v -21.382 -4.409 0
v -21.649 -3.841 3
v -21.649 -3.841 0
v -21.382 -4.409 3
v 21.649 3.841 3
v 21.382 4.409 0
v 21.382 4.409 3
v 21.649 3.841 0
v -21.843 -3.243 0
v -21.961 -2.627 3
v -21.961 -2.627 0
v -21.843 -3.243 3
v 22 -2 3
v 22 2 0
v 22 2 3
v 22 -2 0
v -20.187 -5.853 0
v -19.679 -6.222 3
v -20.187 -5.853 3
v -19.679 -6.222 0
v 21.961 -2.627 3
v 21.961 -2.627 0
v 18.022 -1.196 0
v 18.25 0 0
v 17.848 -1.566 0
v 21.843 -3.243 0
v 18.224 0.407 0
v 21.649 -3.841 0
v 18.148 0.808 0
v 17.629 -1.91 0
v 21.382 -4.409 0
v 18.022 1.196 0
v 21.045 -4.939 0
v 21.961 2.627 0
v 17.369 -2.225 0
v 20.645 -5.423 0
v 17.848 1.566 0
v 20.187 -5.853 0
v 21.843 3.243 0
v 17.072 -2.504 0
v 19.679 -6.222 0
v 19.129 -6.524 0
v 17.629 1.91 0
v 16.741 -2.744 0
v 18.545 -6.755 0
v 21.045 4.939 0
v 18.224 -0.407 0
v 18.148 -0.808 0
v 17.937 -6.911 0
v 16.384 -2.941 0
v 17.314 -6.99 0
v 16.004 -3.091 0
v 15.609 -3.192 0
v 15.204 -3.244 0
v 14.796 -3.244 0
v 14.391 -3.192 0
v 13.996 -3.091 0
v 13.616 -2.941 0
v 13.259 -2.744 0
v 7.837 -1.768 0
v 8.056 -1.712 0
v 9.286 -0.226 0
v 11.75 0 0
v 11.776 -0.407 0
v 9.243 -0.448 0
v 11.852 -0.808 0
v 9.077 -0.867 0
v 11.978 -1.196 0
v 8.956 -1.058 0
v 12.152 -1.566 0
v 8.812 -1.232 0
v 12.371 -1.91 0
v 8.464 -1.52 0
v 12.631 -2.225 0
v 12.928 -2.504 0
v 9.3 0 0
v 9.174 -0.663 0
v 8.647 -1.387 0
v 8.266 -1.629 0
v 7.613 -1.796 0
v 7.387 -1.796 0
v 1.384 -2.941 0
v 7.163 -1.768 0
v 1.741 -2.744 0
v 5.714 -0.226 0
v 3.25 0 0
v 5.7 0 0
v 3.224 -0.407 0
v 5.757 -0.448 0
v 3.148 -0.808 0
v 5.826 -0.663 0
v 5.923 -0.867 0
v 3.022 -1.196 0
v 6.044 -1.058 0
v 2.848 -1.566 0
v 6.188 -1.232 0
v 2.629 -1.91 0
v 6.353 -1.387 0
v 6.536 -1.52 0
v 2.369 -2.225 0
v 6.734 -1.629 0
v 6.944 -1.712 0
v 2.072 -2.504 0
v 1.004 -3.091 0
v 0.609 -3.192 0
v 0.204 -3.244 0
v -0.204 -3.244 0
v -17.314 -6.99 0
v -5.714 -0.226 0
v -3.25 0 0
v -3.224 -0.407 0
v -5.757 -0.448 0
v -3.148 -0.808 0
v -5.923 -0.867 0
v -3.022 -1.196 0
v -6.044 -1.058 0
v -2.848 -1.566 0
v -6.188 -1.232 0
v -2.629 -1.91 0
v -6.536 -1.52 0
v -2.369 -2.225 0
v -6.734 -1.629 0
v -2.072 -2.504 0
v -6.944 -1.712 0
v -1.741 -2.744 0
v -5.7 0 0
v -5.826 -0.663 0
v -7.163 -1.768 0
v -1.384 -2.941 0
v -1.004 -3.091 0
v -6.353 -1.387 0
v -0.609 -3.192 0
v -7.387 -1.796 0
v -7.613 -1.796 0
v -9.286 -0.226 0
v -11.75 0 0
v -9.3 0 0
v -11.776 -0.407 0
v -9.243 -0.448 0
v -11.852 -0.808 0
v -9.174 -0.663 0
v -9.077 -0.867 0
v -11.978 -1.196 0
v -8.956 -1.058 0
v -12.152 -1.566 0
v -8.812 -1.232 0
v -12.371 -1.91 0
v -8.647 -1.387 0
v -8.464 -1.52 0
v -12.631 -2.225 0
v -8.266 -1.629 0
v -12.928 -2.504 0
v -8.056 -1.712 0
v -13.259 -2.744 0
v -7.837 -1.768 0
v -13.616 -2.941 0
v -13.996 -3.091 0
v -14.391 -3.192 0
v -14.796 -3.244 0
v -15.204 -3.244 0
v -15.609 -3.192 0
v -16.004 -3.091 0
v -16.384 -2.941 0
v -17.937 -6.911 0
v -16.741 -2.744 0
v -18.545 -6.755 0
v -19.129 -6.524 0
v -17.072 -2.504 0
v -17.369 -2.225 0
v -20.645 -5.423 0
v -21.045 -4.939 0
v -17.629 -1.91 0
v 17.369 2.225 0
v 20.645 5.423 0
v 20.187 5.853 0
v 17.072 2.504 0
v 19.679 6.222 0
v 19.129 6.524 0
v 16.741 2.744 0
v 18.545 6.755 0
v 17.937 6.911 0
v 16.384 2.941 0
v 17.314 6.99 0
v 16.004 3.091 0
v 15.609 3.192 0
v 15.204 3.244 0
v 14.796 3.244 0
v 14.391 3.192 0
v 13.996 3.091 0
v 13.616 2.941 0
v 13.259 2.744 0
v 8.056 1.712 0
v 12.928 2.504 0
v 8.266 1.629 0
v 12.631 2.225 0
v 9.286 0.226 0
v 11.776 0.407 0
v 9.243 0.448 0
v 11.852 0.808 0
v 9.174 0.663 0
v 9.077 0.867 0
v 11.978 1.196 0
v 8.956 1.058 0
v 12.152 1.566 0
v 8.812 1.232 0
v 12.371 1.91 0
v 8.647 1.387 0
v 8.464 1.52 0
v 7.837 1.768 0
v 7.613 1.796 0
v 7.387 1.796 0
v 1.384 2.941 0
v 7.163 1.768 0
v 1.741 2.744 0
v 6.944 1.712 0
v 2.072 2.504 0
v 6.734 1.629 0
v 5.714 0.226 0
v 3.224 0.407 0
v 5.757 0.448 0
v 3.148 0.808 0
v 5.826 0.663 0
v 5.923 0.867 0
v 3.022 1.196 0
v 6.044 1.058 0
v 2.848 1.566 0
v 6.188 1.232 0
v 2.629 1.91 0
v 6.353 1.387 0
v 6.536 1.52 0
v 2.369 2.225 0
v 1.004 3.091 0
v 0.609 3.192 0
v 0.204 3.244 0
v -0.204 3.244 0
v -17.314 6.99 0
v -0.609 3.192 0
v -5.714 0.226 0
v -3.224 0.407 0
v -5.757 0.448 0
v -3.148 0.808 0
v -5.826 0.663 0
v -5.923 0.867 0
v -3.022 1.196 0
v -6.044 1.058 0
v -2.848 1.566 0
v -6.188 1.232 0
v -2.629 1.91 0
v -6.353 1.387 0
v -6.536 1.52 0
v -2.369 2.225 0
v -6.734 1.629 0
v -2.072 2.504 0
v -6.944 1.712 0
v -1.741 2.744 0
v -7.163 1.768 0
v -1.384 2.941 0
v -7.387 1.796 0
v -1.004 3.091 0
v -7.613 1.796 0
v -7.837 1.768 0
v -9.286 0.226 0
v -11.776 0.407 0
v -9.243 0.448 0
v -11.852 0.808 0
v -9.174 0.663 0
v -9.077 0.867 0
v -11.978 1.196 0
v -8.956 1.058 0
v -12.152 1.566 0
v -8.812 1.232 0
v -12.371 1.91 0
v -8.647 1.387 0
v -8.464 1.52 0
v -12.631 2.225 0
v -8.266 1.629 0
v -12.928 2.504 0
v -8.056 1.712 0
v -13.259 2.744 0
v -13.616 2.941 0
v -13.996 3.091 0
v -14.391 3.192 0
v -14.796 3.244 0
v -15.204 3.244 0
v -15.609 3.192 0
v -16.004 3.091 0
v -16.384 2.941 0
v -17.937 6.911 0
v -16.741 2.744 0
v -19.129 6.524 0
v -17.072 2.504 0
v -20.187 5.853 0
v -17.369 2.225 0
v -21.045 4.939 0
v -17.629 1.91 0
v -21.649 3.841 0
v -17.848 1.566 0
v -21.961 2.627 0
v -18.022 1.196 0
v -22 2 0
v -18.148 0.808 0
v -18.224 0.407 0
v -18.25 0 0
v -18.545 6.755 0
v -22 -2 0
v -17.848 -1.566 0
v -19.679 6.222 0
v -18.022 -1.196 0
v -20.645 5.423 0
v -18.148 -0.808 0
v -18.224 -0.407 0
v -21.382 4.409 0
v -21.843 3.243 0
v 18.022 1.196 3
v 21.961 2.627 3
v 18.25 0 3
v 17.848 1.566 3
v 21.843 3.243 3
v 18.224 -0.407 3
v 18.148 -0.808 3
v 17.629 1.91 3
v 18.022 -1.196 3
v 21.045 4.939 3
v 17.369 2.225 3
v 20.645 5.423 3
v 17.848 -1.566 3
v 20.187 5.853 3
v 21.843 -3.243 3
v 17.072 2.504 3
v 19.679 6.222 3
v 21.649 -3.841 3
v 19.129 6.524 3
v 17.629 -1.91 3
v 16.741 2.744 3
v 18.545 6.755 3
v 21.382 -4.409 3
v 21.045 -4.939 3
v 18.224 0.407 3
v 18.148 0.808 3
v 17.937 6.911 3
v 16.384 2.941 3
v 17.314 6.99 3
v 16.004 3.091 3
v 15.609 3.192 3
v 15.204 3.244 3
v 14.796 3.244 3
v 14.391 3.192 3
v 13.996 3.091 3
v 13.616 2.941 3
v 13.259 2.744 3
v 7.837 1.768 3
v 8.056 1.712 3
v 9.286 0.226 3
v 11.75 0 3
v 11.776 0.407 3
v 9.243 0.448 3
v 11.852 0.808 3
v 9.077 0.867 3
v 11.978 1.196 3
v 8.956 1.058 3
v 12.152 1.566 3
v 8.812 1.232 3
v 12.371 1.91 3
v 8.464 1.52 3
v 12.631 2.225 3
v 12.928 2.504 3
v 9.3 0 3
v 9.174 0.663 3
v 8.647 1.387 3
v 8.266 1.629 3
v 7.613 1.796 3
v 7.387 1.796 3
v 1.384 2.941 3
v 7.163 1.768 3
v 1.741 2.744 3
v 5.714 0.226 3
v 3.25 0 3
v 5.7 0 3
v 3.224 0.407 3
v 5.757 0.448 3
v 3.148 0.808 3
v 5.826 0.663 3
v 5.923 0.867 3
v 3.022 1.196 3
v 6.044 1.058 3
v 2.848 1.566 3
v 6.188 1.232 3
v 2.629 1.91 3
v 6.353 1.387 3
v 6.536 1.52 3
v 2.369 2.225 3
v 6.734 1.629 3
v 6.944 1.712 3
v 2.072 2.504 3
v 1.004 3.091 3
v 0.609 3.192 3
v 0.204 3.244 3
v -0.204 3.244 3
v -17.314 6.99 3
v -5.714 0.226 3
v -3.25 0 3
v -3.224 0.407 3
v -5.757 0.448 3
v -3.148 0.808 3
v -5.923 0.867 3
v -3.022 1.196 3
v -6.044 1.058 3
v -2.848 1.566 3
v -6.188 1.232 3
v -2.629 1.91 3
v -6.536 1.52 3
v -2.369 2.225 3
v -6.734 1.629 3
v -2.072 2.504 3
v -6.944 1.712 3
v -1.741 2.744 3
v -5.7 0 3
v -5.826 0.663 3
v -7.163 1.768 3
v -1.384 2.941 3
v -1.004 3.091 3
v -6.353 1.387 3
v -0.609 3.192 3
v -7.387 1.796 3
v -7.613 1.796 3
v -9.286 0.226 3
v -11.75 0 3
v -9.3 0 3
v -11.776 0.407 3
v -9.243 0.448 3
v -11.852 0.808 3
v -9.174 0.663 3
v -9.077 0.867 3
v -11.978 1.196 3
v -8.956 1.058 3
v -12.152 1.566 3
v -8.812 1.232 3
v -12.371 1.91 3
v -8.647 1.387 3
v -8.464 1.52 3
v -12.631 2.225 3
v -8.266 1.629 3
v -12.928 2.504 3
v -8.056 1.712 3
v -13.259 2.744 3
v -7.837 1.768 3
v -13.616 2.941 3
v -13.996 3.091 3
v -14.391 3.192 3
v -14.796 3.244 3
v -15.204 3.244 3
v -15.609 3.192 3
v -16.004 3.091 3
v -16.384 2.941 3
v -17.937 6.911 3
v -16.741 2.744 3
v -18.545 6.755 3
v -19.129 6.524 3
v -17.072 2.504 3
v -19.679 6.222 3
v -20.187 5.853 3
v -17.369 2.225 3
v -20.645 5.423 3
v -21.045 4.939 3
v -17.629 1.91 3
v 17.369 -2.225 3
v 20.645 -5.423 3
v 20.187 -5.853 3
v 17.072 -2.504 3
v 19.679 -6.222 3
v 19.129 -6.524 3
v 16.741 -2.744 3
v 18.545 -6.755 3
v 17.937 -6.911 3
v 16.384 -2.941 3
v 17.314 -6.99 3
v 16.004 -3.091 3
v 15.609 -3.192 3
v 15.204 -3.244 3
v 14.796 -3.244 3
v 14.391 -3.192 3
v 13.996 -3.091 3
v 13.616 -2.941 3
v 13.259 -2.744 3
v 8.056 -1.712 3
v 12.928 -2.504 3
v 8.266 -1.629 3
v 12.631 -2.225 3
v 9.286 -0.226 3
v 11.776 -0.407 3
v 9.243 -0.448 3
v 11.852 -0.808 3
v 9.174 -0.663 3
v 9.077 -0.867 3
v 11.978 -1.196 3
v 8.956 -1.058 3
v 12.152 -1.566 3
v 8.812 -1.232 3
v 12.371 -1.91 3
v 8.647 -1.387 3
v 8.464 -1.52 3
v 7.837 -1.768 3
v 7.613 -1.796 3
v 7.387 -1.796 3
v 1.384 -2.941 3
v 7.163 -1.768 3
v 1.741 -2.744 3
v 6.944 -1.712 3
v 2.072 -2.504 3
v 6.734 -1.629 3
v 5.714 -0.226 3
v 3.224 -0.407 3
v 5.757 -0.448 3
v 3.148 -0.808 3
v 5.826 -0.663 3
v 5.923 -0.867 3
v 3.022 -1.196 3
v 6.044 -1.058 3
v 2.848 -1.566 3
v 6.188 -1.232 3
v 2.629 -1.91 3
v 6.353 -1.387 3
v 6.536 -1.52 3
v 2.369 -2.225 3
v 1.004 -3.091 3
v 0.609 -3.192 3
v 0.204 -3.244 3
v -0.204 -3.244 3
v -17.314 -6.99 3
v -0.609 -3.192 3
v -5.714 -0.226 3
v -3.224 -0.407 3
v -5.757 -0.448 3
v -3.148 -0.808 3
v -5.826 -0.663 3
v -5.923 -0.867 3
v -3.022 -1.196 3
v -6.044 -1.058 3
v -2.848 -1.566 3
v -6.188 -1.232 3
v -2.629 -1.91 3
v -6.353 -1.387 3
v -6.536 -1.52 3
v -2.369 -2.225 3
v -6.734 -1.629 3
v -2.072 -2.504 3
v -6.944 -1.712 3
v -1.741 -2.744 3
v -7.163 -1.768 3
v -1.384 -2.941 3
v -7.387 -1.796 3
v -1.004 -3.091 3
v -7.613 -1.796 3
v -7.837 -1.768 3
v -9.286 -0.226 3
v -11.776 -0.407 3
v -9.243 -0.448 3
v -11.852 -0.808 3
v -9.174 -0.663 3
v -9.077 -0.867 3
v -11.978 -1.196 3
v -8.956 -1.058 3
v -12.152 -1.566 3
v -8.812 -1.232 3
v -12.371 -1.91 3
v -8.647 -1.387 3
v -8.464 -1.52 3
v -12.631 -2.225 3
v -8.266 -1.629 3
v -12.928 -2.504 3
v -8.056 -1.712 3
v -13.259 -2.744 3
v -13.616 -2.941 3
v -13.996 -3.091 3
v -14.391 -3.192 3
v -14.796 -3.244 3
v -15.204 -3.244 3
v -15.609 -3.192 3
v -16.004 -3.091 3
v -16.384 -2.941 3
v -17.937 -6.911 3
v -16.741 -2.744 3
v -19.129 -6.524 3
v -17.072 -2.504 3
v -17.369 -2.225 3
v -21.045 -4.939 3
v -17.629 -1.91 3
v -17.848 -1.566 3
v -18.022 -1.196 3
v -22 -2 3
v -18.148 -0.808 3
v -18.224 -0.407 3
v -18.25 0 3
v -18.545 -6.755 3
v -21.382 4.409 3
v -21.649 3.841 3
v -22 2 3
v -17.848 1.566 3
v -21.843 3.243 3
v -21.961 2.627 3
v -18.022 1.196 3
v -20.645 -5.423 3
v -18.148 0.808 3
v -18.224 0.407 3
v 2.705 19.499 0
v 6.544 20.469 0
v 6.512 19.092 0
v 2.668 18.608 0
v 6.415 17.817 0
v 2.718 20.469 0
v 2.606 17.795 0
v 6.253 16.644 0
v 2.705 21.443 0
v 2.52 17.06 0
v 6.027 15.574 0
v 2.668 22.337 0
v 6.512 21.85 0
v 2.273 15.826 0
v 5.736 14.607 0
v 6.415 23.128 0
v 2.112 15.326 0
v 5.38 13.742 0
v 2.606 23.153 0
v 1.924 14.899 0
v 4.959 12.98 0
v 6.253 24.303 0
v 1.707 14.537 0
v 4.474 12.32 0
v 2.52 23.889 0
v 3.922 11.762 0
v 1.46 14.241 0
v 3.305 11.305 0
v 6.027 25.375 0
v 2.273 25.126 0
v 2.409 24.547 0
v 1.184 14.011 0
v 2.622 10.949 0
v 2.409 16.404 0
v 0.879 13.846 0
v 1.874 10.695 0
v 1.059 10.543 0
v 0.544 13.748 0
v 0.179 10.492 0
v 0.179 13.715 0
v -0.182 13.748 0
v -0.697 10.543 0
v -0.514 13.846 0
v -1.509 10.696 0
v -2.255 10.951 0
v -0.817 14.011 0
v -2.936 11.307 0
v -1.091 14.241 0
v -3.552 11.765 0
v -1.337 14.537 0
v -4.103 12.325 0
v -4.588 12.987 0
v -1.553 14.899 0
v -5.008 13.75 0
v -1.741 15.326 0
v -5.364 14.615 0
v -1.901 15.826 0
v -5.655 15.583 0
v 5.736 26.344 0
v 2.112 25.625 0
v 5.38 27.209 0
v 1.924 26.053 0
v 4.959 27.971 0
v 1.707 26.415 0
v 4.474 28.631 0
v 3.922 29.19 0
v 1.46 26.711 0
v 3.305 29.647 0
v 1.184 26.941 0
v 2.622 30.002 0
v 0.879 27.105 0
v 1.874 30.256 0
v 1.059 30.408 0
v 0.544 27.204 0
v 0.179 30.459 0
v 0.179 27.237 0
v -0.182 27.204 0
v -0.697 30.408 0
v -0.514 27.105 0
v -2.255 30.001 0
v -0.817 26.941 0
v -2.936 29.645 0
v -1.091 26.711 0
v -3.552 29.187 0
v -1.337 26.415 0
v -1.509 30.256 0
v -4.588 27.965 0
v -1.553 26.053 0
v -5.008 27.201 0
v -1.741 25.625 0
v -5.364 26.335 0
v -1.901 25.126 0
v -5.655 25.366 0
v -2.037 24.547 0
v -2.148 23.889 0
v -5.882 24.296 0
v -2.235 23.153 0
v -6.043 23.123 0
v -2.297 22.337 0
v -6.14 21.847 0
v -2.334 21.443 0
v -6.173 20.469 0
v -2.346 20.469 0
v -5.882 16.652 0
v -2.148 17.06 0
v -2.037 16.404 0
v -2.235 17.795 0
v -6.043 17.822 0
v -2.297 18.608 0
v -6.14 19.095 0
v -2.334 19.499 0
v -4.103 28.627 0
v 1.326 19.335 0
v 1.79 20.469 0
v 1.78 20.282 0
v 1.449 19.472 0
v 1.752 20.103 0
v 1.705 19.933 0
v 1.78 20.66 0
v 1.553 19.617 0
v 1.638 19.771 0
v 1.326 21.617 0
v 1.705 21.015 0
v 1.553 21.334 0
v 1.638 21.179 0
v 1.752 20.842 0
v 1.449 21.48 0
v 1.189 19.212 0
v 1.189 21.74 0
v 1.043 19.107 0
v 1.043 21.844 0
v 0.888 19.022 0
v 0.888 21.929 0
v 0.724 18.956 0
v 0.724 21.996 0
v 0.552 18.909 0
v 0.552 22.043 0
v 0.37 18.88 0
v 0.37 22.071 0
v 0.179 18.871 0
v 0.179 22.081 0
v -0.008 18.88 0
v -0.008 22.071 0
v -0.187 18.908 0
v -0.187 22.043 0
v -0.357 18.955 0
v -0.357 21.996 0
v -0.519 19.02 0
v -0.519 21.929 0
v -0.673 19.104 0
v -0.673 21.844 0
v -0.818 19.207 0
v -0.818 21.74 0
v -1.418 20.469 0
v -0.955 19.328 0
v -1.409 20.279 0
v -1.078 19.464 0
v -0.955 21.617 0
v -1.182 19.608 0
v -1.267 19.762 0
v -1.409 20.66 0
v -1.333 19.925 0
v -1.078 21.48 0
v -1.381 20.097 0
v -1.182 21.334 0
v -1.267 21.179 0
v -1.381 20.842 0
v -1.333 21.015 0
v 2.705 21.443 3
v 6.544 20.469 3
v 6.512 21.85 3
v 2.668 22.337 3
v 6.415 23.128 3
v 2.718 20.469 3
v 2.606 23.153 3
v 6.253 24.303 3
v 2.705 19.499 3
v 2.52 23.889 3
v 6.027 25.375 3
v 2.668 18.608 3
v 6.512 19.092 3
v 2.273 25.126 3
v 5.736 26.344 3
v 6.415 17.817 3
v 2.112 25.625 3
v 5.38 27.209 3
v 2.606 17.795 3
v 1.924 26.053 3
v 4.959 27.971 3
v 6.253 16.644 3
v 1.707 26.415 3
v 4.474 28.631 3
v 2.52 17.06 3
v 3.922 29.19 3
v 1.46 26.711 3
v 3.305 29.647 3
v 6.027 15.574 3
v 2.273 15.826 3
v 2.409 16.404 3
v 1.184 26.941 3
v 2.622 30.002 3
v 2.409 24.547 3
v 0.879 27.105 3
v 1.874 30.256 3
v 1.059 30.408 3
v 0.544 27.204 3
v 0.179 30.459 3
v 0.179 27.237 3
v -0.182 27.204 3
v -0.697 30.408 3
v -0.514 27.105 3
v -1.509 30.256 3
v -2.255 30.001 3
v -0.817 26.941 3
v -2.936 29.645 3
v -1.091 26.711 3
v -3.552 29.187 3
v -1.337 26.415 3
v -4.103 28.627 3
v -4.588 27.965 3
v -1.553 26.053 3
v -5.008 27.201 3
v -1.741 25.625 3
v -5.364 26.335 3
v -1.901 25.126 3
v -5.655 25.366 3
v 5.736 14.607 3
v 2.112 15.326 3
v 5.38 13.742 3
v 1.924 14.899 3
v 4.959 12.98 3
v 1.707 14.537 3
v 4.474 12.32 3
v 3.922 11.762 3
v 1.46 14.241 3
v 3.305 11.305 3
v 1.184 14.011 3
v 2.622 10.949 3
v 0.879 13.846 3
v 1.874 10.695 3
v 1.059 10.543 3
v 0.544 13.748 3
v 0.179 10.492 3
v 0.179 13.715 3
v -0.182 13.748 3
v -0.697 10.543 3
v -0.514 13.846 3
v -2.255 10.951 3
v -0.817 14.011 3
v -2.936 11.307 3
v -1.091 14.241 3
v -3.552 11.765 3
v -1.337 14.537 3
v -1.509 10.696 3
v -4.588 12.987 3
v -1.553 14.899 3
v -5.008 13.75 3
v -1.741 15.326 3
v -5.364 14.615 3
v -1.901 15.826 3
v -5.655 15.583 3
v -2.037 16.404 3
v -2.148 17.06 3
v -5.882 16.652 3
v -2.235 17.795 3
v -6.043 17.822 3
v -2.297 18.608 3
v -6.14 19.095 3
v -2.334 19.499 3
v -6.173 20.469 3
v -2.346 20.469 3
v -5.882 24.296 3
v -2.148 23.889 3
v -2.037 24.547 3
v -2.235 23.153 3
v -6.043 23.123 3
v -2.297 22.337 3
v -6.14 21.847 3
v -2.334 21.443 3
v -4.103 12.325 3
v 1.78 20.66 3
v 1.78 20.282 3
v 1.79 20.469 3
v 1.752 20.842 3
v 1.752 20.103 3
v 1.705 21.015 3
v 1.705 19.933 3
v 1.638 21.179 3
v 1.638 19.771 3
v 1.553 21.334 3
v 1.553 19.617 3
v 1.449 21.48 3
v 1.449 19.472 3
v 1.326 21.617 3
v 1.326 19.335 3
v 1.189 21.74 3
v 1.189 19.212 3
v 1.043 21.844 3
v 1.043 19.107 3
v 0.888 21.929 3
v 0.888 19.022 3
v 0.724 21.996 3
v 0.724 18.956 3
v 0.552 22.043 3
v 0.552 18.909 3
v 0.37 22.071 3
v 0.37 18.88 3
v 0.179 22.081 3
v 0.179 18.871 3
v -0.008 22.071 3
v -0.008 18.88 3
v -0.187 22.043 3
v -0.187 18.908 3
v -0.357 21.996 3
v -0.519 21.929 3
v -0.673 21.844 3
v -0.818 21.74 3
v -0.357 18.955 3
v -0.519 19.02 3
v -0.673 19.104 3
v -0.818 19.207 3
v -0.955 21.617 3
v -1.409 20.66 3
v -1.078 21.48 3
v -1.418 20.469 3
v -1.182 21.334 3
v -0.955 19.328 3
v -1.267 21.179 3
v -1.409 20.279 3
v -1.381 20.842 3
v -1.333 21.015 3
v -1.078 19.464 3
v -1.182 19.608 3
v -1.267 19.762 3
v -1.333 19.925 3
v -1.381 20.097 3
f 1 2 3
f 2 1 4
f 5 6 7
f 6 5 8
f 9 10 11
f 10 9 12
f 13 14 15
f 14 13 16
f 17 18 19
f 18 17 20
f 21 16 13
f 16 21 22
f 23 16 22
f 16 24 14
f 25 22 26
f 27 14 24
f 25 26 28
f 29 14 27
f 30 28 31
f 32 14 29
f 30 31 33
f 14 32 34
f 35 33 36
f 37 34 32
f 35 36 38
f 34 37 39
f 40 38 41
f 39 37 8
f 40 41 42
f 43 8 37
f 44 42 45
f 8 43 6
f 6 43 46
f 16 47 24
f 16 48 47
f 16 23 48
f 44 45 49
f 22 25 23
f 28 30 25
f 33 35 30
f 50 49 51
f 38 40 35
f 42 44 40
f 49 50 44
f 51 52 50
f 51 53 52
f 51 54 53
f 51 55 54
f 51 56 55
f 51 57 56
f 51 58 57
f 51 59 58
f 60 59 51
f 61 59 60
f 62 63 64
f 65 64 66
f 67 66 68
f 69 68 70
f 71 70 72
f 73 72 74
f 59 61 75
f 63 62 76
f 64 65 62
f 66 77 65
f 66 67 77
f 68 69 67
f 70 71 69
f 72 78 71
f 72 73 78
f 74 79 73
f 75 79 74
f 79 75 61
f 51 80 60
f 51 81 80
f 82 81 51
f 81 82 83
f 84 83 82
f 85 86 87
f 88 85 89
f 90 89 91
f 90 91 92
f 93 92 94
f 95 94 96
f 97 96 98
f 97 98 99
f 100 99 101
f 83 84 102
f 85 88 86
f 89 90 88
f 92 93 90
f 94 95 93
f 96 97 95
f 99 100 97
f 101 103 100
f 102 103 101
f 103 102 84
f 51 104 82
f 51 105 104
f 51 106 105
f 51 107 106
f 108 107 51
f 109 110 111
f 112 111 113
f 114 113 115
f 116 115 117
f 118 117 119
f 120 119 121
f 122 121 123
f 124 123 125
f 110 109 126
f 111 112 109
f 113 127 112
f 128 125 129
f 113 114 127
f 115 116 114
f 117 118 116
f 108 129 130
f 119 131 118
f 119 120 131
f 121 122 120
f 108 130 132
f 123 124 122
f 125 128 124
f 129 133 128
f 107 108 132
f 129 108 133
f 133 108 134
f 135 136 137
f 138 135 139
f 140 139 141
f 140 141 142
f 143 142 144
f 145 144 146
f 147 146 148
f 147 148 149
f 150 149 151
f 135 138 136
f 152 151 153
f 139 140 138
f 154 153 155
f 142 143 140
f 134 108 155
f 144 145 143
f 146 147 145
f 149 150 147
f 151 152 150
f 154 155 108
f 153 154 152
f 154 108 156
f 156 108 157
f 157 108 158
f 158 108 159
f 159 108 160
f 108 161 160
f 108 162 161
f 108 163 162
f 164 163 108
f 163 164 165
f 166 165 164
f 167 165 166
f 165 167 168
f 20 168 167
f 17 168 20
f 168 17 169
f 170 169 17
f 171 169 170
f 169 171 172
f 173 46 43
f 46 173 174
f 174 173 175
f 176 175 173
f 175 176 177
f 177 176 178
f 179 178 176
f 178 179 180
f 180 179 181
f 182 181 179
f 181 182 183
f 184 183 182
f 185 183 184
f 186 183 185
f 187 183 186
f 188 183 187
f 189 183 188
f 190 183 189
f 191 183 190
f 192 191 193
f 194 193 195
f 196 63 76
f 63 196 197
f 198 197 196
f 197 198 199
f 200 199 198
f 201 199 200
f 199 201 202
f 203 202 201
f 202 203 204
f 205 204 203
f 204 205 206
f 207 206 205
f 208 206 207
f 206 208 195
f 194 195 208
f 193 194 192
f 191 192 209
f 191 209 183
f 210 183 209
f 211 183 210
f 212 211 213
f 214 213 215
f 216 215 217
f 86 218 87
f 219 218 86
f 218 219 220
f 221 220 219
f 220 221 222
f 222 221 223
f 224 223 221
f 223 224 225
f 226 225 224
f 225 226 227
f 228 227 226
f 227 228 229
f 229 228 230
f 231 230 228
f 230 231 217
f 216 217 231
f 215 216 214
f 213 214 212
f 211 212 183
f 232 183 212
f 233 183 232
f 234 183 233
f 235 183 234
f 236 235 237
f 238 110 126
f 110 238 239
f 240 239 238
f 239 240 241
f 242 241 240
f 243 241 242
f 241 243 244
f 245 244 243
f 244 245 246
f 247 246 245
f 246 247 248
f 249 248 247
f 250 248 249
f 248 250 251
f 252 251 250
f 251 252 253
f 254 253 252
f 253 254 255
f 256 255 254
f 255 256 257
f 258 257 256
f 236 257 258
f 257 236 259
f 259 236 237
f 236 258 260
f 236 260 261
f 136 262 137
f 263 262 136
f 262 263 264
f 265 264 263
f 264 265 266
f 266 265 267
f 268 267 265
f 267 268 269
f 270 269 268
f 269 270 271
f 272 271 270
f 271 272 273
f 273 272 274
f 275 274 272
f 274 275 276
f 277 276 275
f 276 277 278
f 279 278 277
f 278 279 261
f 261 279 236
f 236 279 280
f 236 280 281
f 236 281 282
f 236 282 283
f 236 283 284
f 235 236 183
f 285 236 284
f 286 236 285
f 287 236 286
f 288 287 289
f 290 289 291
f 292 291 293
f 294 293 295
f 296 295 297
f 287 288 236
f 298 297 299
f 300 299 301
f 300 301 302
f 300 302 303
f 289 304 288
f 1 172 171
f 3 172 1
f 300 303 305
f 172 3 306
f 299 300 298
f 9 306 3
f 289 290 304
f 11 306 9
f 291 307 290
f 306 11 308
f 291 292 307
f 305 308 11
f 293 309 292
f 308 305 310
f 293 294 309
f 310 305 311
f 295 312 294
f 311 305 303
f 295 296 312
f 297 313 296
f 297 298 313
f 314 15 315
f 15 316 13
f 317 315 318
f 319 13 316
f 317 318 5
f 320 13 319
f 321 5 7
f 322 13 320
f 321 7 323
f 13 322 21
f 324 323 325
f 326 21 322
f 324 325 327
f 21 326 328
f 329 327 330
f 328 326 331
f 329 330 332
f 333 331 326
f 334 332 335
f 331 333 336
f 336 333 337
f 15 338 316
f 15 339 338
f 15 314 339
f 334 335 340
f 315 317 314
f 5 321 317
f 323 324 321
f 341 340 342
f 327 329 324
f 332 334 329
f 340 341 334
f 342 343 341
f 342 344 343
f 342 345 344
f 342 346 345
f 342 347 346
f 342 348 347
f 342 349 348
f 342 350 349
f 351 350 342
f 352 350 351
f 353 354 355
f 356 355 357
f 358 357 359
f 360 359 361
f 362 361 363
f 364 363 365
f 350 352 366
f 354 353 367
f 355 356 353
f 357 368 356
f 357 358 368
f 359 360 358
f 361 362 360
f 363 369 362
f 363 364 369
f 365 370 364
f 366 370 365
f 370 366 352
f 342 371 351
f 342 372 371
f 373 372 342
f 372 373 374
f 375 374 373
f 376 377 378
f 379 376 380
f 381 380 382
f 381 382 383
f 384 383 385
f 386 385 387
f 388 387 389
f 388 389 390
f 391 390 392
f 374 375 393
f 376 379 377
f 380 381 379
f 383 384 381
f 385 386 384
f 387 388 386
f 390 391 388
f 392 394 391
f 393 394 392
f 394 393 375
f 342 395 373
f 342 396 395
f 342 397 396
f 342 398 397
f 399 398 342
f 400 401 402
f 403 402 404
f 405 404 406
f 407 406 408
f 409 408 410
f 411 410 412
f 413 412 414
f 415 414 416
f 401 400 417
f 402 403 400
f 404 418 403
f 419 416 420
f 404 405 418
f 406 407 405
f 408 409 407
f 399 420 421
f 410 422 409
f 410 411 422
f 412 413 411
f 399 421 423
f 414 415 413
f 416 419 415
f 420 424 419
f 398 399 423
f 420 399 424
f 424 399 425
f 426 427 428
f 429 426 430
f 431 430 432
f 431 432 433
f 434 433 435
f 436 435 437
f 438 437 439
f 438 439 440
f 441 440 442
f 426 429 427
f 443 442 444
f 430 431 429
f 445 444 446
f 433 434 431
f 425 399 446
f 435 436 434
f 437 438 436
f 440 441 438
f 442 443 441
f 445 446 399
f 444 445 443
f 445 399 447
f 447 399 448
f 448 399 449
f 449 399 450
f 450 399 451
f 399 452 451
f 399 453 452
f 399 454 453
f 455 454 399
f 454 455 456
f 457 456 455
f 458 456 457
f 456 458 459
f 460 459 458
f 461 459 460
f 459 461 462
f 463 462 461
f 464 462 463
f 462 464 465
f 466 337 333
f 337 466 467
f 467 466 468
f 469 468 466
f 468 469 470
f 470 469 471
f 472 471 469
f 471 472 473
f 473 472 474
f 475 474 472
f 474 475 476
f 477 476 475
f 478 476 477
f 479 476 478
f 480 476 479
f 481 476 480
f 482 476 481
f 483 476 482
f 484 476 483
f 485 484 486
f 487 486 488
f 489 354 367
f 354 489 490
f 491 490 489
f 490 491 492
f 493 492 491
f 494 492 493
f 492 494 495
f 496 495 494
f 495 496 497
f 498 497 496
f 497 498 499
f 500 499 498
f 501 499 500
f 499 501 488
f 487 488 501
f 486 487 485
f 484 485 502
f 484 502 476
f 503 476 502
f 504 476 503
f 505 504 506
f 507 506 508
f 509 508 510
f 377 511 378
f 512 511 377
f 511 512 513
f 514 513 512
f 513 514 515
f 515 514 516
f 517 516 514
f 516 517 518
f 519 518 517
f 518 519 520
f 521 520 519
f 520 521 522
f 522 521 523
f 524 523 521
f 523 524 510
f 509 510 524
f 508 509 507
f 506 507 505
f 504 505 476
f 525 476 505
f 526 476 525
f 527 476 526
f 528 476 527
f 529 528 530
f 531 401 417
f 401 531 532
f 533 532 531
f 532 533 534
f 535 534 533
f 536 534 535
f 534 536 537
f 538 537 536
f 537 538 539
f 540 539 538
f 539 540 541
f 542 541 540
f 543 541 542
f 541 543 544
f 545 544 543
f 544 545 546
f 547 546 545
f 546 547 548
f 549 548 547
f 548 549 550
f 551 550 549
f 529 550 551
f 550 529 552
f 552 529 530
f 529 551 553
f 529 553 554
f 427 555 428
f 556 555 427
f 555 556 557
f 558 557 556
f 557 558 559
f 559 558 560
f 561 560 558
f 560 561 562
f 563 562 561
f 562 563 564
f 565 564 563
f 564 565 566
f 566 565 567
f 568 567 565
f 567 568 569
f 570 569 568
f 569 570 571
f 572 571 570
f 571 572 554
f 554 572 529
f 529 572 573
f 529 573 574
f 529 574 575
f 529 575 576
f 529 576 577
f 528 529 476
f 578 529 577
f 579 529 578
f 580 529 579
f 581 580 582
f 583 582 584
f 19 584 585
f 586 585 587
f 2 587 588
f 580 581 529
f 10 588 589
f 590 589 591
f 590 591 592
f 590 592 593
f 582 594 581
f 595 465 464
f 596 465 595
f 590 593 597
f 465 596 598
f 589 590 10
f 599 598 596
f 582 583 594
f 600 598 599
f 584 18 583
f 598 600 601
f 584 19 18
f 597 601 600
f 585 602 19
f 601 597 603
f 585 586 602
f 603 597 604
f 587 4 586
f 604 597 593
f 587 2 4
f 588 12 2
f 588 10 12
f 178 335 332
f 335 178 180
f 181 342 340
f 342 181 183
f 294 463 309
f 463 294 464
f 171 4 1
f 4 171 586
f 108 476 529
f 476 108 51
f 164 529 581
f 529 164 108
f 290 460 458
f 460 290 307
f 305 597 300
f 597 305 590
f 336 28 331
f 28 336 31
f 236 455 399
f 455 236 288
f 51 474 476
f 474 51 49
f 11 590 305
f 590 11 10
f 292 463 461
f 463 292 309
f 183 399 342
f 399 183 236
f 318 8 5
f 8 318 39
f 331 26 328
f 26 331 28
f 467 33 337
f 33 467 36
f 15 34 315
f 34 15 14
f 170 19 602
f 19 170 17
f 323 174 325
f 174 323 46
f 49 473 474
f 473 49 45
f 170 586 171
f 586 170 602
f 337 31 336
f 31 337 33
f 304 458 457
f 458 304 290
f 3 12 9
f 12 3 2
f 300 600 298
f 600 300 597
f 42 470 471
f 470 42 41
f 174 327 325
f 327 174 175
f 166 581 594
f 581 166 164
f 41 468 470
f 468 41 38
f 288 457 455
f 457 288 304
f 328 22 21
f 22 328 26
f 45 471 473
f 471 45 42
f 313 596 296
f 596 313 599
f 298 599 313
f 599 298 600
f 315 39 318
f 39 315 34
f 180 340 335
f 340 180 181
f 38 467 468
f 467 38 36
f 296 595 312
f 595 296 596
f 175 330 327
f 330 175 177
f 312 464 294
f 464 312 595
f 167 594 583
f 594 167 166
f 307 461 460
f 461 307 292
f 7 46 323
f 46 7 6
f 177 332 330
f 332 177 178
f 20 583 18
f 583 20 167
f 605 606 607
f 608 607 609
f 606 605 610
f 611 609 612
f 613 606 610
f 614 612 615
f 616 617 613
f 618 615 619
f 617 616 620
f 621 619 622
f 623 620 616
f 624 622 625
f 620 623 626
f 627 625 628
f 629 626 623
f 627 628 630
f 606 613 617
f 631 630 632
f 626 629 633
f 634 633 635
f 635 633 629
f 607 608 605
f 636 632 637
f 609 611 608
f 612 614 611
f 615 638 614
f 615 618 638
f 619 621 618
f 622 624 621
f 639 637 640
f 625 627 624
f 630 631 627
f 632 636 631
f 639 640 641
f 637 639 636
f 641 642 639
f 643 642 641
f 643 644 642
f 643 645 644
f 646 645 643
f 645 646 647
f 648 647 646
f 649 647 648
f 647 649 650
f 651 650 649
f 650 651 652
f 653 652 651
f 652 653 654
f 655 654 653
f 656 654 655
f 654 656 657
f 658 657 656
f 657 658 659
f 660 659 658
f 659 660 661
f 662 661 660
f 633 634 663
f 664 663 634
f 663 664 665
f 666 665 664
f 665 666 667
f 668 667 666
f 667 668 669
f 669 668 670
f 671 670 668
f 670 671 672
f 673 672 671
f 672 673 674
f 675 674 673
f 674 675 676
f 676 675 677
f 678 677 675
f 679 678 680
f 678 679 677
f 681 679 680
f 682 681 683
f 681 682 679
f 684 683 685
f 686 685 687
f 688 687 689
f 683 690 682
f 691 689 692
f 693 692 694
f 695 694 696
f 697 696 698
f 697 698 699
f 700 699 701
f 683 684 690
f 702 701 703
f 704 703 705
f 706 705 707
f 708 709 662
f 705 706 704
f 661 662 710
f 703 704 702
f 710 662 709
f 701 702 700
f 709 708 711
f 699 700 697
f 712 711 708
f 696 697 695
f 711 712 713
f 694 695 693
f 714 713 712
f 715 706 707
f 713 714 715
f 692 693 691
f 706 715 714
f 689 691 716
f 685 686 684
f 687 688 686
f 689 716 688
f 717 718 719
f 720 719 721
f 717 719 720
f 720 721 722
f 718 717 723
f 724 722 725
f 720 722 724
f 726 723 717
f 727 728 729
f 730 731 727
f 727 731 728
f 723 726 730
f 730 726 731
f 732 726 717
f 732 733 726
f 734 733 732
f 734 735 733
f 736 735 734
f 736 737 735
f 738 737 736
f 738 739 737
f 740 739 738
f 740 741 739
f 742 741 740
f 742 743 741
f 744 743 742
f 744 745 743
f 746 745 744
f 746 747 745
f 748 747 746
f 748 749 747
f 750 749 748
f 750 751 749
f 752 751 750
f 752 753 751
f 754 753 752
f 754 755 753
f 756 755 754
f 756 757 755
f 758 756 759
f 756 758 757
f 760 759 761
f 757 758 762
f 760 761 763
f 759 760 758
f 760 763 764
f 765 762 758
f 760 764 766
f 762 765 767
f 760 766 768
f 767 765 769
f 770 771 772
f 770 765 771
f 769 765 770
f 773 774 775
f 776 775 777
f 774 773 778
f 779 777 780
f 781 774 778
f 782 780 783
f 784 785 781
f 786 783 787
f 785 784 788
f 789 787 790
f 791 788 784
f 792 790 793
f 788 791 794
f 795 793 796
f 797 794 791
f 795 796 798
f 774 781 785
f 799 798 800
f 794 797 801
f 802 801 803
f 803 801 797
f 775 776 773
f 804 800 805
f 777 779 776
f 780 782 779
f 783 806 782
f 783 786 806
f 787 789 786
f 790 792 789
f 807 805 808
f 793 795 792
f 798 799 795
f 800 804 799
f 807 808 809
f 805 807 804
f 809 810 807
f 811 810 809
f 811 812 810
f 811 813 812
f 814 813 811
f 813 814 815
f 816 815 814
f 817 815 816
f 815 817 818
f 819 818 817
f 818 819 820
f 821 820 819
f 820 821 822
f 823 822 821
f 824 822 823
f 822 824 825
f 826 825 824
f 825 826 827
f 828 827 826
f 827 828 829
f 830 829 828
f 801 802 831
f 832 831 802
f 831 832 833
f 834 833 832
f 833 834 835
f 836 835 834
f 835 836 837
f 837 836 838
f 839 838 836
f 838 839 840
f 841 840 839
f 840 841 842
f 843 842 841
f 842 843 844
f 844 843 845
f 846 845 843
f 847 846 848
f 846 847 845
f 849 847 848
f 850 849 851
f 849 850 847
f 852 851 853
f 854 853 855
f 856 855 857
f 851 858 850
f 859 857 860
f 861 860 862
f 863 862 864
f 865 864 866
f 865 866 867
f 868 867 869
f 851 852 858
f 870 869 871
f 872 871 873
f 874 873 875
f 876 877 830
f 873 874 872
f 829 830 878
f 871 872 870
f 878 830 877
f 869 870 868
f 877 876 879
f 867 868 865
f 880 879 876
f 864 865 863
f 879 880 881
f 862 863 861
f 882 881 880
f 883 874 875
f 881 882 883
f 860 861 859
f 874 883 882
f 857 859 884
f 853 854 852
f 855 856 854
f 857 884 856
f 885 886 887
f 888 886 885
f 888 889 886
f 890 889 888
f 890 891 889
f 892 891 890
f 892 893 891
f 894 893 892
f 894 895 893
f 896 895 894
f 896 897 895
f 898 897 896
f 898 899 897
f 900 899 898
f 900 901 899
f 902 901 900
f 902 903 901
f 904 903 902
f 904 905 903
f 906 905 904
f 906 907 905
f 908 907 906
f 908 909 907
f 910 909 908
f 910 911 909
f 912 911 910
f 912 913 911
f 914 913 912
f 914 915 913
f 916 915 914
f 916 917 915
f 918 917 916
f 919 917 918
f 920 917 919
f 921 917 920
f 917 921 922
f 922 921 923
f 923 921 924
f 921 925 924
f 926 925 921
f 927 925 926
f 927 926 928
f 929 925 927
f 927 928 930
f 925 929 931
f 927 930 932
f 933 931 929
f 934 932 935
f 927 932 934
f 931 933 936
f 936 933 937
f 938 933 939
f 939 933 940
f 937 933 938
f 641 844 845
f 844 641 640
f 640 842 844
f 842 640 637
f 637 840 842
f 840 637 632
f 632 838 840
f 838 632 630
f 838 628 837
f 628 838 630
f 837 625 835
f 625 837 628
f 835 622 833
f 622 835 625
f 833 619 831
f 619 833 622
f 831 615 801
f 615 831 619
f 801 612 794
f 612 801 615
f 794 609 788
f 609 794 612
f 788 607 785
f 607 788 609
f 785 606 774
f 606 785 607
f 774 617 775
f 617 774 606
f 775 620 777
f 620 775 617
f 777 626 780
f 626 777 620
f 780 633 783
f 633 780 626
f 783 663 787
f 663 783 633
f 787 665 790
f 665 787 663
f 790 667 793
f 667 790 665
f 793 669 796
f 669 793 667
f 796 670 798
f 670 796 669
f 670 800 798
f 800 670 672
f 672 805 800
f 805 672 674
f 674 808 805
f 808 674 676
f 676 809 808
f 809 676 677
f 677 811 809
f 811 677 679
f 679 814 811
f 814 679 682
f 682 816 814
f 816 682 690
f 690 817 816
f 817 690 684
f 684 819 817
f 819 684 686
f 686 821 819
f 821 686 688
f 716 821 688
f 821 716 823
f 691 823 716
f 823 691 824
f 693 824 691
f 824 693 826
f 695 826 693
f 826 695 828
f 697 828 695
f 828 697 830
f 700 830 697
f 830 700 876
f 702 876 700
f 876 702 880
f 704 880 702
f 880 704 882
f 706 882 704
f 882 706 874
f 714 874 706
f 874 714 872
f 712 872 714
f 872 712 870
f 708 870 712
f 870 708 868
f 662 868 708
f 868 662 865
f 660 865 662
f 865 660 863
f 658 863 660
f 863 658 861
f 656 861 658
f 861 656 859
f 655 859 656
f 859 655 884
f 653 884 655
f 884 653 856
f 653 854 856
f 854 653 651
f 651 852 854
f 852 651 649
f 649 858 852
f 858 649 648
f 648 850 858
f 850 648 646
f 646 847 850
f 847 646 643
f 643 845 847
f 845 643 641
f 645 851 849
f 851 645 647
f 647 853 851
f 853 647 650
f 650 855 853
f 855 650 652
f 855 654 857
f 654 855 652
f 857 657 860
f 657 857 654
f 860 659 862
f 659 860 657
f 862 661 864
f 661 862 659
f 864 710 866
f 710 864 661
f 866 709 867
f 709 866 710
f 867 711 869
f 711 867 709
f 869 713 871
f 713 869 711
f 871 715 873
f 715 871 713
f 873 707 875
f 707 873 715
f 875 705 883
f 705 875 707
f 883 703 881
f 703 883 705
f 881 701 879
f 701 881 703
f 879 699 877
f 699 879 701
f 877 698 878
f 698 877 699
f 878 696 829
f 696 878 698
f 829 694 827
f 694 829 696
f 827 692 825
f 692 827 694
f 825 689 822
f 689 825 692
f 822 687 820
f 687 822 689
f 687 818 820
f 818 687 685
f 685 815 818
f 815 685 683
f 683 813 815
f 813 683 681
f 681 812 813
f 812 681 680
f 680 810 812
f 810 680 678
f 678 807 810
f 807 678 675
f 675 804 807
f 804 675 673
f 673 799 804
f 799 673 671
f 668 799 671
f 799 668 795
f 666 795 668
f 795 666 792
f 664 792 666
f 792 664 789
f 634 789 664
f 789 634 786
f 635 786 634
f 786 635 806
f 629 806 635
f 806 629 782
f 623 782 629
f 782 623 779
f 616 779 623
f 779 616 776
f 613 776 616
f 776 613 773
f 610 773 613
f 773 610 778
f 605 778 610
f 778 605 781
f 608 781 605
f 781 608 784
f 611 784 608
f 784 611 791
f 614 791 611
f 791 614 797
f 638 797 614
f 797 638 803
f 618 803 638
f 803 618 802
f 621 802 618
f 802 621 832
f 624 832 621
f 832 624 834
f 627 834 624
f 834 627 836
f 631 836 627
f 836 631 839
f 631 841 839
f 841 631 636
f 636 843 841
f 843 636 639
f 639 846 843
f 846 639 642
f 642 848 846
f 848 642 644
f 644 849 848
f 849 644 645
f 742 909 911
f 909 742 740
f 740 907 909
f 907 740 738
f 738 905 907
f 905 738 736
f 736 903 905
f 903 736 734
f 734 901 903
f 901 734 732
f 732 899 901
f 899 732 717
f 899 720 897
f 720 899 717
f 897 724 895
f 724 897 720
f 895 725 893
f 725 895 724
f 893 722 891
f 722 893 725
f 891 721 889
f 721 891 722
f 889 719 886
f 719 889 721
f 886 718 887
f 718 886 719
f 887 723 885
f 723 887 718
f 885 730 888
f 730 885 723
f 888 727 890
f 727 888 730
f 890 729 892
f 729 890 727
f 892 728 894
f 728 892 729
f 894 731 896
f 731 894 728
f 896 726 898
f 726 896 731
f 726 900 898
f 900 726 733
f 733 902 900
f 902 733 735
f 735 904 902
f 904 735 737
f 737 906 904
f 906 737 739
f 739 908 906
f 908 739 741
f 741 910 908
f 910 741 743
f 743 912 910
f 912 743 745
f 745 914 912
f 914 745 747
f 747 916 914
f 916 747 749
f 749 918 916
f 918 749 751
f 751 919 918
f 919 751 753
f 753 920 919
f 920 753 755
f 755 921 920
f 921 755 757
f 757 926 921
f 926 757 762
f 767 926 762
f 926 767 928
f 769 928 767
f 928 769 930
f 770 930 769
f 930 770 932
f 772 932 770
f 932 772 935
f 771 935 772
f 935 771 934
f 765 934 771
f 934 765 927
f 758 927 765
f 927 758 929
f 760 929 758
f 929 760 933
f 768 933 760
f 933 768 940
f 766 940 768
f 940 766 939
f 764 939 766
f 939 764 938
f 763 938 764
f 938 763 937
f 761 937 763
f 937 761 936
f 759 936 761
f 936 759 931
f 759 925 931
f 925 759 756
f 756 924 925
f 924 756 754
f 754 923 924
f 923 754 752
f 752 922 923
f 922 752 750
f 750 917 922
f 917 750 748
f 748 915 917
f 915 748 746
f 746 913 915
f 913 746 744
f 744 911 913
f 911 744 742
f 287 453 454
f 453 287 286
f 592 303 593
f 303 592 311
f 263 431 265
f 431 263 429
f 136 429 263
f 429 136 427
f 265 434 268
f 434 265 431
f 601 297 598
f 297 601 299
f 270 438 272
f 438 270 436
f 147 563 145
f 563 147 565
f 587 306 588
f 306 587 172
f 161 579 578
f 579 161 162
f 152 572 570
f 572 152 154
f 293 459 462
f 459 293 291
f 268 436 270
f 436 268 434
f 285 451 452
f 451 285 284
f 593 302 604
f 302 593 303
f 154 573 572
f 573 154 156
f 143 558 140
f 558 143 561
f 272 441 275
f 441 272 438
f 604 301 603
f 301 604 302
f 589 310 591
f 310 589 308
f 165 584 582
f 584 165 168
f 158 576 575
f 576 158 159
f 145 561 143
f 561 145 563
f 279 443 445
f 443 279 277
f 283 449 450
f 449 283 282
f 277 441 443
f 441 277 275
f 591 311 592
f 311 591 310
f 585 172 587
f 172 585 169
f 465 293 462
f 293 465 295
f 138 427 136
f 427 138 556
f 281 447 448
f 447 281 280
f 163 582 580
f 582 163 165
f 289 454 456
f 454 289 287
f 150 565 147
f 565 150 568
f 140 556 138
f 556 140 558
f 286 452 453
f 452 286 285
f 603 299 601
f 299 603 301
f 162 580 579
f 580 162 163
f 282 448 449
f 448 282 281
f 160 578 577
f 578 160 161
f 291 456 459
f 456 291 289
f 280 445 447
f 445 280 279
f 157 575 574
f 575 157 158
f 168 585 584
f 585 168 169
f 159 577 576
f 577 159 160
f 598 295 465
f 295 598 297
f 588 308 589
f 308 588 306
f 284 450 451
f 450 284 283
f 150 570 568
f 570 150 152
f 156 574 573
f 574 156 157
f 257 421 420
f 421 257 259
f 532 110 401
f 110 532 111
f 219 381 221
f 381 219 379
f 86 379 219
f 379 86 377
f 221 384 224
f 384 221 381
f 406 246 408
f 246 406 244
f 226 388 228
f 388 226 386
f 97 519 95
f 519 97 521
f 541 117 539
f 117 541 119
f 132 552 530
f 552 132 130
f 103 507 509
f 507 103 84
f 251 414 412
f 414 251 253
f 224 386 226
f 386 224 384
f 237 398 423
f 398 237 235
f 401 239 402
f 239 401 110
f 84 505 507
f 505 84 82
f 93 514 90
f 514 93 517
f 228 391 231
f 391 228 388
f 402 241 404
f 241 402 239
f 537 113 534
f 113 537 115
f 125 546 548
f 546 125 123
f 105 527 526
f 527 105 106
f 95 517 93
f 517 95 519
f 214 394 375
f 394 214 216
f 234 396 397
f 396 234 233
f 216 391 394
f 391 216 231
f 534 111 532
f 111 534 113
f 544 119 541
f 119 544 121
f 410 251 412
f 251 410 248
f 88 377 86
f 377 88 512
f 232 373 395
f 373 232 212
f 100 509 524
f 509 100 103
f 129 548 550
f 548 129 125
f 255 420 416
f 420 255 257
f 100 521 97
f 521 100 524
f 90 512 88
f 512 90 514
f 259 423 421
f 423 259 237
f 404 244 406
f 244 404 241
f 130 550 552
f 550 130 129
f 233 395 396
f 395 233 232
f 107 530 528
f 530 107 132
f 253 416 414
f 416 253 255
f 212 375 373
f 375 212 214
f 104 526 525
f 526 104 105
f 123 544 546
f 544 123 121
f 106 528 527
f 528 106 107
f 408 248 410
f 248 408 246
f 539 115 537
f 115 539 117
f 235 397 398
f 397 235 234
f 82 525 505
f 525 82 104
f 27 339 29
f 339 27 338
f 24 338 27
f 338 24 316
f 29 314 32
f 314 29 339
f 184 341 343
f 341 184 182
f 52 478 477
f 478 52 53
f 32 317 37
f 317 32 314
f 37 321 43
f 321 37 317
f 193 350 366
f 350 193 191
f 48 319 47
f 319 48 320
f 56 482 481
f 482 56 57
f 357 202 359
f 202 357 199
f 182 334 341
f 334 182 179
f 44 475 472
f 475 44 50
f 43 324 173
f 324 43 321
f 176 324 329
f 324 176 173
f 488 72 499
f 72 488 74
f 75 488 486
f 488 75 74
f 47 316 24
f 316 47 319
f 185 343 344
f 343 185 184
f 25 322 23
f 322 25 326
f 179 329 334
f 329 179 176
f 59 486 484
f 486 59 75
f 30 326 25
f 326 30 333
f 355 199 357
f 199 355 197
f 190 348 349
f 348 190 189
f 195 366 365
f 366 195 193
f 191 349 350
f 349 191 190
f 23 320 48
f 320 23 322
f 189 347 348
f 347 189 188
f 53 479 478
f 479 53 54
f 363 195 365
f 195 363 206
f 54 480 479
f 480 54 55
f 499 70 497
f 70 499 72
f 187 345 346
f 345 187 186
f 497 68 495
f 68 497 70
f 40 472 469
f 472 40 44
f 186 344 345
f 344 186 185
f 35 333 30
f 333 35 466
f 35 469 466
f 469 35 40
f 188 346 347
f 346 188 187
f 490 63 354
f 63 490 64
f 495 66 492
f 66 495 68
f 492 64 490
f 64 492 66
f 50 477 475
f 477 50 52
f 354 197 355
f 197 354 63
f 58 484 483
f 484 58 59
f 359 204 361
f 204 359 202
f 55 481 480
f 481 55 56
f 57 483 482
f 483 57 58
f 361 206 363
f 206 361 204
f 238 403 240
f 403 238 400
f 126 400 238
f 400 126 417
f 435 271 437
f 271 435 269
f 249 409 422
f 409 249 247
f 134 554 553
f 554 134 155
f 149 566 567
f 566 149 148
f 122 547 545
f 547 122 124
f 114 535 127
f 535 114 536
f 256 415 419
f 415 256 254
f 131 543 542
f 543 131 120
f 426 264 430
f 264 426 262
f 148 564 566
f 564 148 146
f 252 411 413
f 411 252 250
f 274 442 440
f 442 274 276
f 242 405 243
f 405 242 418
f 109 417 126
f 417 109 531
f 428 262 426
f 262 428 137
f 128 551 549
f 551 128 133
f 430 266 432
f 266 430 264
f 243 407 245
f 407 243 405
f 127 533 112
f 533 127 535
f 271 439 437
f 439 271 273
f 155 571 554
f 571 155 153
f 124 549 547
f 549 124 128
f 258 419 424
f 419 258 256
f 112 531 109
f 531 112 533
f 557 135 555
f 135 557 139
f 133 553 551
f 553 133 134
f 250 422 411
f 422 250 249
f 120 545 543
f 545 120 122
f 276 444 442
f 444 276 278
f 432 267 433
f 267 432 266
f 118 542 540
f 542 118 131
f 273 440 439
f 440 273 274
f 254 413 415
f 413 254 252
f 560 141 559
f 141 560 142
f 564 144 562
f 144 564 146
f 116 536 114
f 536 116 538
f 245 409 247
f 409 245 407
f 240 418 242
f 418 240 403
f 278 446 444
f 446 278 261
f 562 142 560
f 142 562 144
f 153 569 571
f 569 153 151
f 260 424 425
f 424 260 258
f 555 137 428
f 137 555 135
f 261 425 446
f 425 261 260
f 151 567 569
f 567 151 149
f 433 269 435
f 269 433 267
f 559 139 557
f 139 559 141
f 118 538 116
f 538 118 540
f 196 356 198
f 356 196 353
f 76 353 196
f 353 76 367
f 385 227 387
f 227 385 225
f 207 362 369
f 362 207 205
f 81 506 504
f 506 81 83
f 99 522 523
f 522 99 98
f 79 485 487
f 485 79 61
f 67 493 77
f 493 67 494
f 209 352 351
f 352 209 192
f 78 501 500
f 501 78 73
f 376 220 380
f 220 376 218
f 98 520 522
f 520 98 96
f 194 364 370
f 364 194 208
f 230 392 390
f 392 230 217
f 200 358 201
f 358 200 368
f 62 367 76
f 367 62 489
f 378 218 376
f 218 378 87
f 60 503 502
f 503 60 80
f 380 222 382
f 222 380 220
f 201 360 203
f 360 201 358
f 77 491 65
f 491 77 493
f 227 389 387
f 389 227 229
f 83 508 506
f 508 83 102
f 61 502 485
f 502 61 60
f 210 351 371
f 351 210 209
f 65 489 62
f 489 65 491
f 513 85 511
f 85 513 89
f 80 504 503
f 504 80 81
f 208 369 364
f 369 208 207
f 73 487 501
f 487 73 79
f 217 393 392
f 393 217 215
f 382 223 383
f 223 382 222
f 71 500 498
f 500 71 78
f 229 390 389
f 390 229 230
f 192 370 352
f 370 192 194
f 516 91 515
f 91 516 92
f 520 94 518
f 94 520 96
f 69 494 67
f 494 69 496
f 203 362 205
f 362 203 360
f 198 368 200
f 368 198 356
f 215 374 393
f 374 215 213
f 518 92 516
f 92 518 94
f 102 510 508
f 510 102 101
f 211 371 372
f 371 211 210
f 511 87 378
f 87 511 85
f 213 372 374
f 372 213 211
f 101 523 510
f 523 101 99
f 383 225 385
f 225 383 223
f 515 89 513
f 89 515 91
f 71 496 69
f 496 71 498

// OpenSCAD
$fn = 50;


difference() {
	union() {
		hull() {
			translate(v = [-17.0000000000, 2.0000000000, 0]) {
				cylinder(h = 3, r = 5);
			}
			translate(v = [17.0000000000, 2.0000000000, 0]) {
				cylinder(h = 3, r = 5);
			}
			translate(v = [-17.0000000000, -2.0000000000, 0]) {
				cylinder(h = 3, r = 5);
			}
			translate(v = [17.0000000000, -2.0000000000, 0]) {
				cylinder(h = 3, r = 5);
			}
		}
		translate(v = [0, 30.0000000000, 0]) {
			linear_extrude(height = 3) {
				text(font = "DejaVu Sans Mono:style=Bold", halign = "center", size = 19.0000000000, text = "0", valign = "top");
			}
		}
	}
	union() {
		translate(v = [-15.0000000000, 0.0000000000, 0]) {
			translate(v = [0, 0, -100]) {
				cylinder(h = 200, r = 3.2500000000);
			}
		}
		translate(v = [0, 0, -100]) {
			cylinder(h = 200, r = 3.2500000000);
		}
		translate(v = [15.0000000000, 0.0000000000, 0]) {
			translate(v = [0, 0, -100]) {
				cylinder(h = 200, r = 3.2500000000);
			}
		}
		translate(v = [-15.0000000000, 0.0000000000, 0]) {
			translate(v = [0, 0, -100]) {
				cylinder(h = 200, r = 1.8000000000);
			}
		}
		translate(v = [-7.5000000000, 0.0000000000, 0]) {
			translate(v = [0, 0, -100]) {
				cylinder(h = 200, r = 1.8000000000);
			}
		}
		translate(v = [0, 0, -100]) {
			cylinder(h = 200, r = 1.8000000000);
		}
		translate(v = [7.5000000000, 0.0000000000, 0]) {
			translate(v = [0, 0, -100]) {
				cylinder(h = 200, r = 1.8000000000);
			}
		}
		translate(v = [15.0000000000, 0.0000000000, 0]) {
			translate(v = [0, 0, -100]) {
				cylinder(h = 200, r = 1.8000000000);
			}
		}
	}
}
